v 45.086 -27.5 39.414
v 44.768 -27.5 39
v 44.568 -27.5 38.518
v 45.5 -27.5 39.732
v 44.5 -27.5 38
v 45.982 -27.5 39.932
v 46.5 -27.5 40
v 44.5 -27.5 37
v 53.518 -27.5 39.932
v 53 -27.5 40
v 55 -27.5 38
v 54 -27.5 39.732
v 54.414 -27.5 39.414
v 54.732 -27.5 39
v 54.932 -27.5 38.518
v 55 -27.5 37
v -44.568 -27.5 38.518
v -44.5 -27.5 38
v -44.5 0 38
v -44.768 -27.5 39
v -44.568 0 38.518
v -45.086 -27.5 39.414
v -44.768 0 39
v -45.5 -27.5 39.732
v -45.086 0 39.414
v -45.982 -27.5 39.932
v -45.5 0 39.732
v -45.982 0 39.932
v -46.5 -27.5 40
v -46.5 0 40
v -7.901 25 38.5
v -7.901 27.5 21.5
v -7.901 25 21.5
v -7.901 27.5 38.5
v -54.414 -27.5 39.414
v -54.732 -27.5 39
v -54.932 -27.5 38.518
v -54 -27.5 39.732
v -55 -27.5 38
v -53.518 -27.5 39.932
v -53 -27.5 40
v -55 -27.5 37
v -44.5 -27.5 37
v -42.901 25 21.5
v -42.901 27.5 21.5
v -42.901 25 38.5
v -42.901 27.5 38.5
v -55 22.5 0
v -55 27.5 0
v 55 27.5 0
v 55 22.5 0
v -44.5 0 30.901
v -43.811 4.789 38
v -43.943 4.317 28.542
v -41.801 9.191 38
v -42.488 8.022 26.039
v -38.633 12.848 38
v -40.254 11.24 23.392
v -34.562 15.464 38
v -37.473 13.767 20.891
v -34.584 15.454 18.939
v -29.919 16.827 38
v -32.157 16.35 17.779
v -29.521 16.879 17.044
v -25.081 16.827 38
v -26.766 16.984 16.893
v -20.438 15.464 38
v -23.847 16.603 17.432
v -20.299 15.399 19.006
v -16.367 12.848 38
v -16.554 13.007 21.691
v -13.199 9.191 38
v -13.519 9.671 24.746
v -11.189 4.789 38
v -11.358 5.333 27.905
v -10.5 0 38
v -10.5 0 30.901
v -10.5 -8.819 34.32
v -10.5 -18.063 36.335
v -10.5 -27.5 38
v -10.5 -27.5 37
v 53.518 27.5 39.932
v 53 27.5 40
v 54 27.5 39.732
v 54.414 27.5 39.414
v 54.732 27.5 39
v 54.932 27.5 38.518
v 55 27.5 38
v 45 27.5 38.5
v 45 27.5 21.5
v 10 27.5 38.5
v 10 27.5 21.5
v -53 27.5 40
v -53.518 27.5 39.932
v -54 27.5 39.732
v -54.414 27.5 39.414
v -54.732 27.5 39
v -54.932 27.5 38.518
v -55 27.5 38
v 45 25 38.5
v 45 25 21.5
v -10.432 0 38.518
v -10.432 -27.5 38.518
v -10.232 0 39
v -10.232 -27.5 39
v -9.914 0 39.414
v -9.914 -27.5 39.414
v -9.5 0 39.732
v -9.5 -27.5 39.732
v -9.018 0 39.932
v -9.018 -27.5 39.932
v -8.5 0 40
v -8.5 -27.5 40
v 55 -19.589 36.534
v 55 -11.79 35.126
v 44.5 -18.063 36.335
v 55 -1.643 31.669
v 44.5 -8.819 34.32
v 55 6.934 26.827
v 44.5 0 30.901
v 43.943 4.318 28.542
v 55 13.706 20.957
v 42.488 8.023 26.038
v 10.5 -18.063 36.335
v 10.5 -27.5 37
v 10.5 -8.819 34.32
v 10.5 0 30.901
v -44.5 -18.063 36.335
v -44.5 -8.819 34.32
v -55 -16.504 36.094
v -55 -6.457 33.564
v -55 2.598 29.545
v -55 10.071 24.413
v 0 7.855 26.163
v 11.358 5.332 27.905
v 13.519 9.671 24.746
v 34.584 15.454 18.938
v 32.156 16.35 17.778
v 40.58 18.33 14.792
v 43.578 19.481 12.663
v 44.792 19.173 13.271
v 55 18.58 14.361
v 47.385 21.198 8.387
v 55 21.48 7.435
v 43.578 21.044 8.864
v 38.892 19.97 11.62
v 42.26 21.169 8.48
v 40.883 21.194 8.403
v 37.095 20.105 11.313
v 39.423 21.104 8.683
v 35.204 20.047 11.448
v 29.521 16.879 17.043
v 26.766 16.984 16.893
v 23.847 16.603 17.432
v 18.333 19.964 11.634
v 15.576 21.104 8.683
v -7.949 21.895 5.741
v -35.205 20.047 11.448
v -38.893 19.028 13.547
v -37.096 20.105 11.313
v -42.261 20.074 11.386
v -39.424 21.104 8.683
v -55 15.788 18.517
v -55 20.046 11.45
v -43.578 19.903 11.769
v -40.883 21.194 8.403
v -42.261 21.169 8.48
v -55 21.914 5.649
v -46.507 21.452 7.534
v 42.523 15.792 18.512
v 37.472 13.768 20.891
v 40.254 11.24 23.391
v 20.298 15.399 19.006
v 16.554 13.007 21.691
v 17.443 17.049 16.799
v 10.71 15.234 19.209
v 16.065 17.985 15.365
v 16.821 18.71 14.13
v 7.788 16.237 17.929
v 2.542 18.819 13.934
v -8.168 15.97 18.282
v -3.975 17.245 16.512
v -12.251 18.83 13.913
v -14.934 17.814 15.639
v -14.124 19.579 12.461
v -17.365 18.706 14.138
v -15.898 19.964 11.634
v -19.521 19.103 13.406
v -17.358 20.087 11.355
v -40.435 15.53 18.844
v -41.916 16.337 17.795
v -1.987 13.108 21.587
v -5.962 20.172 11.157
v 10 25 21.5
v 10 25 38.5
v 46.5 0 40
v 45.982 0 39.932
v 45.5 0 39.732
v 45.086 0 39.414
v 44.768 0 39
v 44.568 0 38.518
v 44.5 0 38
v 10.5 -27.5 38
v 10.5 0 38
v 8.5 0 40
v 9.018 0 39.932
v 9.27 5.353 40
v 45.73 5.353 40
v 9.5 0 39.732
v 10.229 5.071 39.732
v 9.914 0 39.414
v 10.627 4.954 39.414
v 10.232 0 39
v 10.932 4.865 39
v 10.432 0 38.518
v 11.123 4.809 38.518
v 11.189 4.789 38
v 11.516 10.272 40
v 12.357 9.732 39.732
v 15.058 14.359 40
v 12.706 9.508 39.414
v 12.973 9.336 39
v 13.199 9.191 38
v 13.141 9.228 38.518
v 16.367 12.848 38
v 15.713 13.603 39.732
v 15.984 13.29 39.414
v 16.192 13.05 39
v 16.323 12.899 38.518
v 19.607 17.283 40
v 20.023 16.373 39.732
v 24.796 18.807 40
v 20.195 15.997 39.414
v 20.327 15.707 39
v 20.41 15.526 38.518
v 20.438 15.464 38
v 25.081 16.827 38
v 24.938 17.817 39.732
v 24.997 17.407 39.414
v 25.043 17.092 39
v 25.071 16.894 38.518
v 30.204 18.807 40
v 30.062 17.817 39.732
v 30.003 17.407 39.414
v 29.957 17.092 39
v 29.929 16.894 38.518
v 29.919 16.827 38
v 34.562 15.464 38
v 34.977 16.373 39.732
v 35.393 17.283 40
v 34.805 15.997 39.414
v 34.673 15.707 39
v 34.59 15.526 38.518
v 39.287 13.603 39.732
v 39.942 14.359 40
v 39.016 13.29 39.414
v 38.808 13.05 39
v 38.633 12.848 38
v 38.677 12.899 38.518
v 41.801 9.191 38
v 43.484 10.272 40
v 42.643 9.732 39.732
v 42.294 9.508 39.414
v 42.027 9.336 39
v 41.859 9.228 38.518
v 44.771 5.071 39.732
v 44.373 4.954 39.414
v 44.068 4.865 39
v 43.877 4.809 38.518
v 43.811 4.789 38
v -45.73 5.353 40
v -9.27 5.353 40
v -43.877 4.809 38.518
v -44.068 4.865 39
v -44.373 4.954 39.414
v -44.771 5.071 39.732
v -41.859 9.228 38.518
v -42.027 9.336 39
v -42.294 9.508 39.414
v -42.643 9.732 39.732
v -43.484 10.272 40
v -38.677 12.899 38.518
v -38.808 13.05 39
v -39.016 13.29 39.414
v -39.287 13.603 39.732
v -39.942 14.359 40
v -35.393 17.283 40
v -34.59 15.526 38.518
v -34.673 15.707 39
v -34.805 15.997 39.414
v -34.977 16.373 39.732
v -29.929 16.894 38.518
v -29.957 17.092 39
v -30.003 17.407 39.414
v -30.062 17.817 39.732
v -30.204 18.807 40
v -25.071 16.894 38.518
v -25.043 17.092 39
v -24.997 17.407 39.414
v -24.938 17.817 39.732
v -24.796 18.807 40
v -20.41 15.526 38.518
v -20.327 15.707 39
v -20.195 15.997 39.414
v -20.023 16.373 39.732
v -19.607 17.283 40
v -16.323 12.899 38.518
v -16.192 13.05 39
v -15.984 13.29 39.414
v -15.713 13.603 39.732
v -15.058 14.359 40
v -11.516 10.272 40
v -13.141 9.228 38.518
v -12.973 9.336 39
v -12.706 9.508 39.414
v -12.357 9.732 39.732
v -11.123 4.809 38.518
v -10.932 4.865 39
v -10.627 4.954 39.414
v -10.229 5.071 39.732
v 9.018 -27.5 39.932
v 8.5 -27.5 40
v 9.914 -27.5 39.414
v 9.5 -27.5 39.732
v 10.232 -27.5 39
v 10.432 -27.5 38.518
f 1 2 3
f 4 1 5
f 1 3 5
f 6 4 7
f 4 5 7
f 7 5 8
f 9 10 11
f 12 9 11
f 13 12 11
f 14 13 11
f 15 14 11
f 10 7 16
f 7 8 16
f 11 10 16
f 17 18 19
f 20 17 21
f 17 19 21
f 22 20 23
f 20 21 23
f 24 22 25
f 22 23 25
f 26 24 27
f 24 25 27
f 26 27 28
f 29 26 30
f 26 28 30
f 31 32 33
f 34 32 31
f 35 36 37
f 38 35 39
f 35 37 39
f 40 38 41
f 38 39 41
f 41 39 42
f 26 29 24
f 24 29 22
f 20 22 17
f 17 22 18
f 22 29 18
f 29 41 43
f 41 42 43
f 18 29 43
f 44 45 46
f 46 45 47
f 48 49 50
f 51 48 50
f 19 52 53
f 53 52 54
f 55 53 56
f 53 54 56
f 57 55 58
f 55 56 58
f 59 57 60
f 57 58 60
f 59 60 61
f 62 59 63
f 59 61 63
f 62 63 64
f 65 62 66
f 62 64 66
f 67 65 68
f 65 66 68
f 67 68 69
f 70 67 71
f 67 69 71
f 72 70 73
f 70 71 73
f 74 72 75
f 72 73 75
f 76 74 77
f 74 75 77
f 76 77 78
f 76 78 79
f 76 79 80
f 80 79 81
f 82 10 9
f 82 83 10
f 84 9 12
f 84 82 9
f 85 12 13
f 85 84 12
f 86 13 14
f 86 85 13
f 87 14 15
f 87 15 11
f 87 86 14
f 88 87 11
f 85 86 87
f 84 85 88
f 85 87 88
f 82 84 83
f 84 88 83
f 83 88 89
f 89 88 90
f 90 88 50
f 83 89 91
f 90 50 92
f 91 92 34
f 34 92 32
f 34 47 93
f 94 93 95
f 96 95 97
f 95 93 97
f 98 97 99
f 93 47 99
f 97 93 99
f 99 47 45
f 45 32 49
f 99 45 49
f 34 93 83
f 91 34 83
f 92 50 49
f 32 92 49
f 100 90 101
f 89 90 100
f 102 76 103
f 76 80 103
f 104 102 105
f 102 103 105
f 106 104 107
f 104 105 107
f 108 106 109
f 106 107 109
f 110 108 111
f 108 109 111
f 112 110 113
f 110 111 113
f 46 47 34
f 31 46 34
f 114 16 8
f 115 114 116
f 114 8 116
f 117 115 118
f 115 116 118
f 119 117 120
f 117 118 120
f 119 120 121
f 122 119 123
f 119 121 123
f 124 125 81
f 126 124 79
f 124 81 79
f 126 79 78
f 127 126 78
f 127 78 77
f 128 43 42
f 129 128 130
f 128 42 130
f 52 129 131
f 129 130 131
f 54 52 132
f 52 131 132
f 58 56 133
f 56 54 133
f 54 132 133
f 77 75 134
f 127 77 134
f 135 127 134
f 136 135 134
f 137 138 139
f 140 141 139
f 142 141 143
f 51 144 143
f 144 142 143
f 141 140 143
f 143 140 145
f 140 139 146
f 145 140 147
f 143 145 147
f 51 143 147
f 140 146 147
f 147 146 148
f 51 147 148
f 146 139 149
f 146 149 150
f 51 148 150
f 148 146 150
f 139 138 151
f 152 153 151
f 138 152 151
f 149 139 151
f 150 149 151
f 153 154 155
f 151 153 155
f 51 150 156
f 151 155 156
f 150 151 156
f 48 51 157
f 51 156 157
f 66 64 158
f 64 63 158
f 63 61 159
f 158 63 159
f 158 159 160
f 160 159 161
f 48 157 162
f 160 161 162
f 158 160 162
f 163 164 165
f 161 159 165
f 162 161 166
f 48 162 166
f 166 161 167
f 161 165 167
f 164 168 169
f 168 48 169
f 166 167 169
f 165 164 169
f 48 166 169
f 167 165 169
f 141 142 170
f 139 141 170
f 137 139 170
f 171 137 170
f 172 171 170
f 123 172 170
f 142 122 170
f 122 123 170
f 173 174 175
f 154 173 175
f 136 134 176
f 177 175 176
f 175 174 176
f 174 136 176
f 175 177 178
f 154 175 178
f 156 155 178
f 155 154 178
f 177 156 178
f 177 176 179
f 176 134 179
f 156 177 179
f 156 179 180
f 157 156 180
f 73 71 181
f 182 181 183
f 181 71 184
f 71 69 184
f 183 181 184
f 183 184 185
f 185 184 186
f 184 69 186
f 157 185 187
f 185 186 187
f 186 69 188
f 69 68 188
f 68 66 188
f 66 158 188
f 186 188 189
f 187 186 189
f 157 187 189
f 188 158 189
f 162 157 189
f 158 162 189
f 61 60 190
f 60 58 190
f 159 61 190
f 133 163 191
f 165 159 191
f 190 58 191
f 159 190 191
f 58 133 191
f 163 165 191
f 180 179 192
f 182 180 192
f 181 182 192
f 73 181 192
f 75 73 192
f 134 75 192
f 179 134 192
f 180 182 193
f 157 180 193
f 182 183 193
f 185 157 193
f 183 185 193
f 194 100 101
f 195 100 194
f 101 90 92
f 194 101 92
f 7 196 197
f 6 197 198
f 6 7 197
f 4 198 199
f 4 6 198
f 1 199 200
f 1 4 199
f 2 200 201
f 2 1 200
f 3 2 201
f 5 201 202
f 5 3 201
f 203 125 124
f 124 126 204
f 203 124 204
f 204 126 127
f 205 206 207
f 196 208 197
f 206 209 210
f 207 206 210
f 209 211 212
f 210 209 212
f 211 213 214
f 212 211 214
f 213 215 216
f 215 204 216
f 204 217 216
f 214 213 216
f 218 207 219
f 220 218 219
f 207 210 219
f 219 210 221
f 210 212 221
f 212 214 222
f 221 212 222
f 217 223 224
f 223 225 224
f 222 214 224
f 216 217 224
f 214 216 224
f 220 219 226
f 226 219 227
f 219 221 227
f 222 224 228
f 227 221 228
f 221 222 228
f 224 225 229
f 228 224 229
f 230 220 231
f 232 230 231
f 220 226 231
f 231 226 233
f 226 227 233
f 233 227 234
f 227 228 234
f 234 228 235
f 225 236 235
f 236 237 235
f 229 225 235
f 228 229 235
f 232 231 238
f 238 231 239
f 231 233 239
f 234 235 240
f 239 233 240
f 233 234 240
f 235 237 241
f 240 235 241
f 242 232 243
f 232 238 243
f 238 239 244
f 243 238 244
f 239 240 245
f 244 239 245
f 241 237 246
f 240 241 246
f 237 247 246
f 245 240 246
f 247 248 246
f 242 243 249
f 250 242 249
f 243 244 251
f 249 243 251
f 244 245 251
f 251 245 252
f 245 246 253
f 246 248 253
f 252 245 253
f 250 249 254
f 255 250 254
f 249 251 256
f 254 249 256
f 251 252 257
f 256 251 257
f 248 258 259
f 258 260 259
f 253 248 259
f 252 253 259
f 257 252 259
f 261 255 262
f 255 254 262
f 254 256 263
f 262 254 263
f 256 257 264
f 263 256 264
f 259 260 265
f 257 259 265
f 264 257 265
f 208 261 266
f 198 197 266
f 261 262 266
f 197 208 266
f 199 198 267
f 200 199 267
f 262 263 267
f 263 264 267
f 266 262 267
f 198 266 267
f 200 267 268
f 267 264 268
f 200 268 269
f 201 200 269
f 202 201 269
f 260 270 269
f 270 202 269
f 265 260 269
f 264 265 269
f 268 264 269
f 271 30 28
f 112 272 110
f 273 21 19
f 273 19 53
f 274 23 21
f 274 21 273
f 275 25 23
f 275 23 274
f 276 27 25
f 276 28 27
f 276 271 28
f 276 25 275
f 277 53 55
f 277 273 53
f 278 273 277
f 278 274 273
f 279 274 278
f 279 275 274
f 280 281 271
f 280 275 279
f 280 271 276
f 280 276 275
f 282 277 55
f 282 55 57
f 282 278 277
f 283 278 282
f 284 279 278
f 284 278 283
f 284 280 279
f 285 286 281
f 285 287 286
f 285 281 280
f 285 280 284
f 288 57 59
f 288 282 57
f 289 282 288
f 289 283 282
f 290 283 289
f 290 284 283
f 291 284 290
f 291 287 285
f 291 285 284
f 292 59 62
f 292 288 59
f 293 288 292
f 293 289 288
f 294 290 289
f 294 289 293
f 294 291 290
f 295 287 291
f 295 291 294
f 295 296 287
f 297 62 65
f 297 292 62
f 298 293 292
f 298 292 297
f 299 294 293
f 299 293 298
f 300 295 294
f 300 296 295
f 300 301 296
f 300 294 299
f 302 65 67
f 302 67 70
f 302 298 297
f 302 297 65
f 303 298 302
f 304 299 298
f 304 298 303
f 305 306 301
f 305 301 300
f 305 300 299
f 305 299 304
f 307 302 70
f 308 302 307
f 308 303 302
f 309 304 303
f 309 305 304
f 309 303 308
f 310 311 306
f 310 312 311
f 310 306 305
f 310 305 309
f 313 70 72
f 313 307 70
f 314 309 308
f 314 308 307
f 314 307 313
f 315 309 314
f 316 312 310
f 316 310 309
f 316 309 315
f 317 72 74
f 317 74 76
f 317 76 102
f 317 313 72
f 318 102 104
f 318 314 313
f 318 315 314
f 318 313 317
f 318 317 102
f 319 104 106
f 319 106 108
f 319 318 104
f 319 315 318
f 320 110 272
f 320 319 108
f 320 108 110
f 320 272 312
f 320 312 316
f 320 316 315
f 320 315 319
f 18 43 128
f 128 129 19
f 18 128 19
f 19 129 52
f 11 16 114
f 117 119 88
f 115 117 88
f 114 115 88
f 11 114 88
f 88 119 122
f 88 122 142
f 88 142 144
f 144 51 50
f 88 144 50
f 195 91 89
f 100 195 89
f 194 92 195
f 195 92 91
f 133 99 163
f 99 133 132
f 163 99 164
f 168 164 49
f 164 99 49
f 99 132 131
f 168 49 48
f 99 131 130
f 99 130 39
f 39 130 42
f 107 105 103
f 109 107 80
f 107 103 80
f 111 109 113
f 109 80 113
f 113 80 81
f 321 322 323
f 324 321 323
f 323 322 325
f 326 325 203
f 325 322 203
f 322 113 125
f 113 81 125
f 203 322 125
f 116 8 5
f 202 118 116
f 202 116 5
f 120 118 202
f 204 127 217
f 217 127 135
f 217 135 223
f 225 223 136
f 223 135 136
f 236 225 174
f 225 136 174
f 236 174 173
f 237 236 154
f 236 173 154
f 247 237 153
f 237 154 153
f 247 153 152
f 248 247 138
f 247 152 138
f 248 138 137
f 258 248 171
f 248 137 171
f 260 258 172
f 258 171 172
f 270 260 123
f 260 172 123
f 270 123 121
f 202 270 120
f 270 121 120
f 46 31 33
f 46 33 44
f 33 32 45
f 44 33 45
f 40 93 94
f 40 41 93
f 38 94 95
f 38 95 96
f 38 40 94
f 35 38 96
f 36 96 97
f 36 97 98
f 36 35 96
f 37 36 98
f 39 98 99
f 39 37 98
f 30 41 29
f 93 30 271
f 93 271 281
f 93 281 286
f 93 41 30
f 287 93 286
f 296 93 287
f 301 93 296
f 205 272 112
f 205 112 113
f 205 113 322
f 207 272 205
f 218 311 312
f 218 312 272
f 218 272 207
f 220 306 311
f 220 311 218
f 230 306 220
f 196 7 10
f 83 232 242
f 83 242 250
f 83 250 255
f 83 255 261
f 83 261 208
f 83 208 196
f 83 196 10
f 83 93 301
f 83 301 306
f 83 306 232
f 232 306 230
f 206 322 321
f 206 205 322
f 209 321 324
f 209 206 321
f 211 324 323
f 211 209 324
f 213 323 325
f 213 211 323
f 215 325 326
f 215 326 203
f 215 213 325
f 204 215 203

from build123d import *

# Parameters (mm, degrees)
F0_W     = 10.5
F0_H     = 27.5
F1_DEPTH = 40
F3_DEPTH = 120.3
F4_W     = 17.5
F4_H     = 17
F5_DEPTH = 2.5
F6_R     = 2


with BuildPart() as f1:
    # F0 (on Top) → F1 (new body)
    with BuildSketch(Plane.XY):
        with Locations((-49.75, -13.75)):
            Rectangle(F0_W, F0_H)
        with BuildLine():
            Line((55, 0), (55, 27.5))
            Line((55, 27.5), (-55, 27.5))
            Line((-55, 27.5), (-55, 0))
            Line((-55, 0), (-44.5, 0))
            ThreePointArc((-44.5, 0), (-27.5, 17), (-10.5, 0))
            Line((-10.5, 0), (0, 0))
            Line((0, 0), (10.5, 0))
            ThreePointArc((10.5, 0), (27.5, 17), (44.5, 0))
            Line((44.5, 0), (55, 0))
        make_face()
        Polygon((10.5, -27.5), (10.5, 0), (0, 0), (-10.5, 0), (-10.5, -27.5), align=None)
        with Locations((49.75, -13.75)):
            Rectangle(F0_W, F0_H)
    extrude(amount=F1_DEPTH)

    # F2 (on face) → F3 (cut)
    with BuildSketch(Plane(origin=(-55, 0, 0), x_dir=(0, -1, 0), z_dir=(-1, 0, 0))):
        with BuildLine():
            add(Edge.make_bspline(
                [(27.5, 37), (-22.500001, 37), (-22.500001, 0)],
                knots=[4.712389, 4.712389, 4.712389, 6.283185, 6.283185, 6.283185], degree=2, weights=[1, 0.707107, 1]))
            Line((-22.500001, 0), (27.5, 0))
            Line((27.5, 0), (27.5, 37))
        make_face()
    extrude(amount=-F3_DEPTH, mode=Mode.SUBTRACT)

    # F4 (on face) → F5 (cut)
    with BuildSketch(Plane(origin=(0, 27.5, 0), x_dir=(-1, 0, 0), z_dir=(0, 1, 0))):
        with Locations((-36.25, 30)):
            Rectangle(F4_W, F4_H)
        with Locations((-18.75, 30)):
            Rectangle(F4_W, F4_H)
        with Locations((16.651222, 30)):
            Rectangle(F4_W, F4_H)
        with Locations((34.151222, 30)):
            Rectangle(F4_W, F4_H)
    extrude(amount=-F5_DEPTH, mode=Mode.SUBTRACT)

    # F6
    f6_edges = [f1.edges().sort_by_distance(p)[0] for p in [
        (-44.5, -13.75, 40),
        (10.5, -13.75, 40),
        (55, 0, 40),
        (-55, 0, 40),
    ]]
    fillet(f6_edges, radius=F6_R)


solid = f1.part
